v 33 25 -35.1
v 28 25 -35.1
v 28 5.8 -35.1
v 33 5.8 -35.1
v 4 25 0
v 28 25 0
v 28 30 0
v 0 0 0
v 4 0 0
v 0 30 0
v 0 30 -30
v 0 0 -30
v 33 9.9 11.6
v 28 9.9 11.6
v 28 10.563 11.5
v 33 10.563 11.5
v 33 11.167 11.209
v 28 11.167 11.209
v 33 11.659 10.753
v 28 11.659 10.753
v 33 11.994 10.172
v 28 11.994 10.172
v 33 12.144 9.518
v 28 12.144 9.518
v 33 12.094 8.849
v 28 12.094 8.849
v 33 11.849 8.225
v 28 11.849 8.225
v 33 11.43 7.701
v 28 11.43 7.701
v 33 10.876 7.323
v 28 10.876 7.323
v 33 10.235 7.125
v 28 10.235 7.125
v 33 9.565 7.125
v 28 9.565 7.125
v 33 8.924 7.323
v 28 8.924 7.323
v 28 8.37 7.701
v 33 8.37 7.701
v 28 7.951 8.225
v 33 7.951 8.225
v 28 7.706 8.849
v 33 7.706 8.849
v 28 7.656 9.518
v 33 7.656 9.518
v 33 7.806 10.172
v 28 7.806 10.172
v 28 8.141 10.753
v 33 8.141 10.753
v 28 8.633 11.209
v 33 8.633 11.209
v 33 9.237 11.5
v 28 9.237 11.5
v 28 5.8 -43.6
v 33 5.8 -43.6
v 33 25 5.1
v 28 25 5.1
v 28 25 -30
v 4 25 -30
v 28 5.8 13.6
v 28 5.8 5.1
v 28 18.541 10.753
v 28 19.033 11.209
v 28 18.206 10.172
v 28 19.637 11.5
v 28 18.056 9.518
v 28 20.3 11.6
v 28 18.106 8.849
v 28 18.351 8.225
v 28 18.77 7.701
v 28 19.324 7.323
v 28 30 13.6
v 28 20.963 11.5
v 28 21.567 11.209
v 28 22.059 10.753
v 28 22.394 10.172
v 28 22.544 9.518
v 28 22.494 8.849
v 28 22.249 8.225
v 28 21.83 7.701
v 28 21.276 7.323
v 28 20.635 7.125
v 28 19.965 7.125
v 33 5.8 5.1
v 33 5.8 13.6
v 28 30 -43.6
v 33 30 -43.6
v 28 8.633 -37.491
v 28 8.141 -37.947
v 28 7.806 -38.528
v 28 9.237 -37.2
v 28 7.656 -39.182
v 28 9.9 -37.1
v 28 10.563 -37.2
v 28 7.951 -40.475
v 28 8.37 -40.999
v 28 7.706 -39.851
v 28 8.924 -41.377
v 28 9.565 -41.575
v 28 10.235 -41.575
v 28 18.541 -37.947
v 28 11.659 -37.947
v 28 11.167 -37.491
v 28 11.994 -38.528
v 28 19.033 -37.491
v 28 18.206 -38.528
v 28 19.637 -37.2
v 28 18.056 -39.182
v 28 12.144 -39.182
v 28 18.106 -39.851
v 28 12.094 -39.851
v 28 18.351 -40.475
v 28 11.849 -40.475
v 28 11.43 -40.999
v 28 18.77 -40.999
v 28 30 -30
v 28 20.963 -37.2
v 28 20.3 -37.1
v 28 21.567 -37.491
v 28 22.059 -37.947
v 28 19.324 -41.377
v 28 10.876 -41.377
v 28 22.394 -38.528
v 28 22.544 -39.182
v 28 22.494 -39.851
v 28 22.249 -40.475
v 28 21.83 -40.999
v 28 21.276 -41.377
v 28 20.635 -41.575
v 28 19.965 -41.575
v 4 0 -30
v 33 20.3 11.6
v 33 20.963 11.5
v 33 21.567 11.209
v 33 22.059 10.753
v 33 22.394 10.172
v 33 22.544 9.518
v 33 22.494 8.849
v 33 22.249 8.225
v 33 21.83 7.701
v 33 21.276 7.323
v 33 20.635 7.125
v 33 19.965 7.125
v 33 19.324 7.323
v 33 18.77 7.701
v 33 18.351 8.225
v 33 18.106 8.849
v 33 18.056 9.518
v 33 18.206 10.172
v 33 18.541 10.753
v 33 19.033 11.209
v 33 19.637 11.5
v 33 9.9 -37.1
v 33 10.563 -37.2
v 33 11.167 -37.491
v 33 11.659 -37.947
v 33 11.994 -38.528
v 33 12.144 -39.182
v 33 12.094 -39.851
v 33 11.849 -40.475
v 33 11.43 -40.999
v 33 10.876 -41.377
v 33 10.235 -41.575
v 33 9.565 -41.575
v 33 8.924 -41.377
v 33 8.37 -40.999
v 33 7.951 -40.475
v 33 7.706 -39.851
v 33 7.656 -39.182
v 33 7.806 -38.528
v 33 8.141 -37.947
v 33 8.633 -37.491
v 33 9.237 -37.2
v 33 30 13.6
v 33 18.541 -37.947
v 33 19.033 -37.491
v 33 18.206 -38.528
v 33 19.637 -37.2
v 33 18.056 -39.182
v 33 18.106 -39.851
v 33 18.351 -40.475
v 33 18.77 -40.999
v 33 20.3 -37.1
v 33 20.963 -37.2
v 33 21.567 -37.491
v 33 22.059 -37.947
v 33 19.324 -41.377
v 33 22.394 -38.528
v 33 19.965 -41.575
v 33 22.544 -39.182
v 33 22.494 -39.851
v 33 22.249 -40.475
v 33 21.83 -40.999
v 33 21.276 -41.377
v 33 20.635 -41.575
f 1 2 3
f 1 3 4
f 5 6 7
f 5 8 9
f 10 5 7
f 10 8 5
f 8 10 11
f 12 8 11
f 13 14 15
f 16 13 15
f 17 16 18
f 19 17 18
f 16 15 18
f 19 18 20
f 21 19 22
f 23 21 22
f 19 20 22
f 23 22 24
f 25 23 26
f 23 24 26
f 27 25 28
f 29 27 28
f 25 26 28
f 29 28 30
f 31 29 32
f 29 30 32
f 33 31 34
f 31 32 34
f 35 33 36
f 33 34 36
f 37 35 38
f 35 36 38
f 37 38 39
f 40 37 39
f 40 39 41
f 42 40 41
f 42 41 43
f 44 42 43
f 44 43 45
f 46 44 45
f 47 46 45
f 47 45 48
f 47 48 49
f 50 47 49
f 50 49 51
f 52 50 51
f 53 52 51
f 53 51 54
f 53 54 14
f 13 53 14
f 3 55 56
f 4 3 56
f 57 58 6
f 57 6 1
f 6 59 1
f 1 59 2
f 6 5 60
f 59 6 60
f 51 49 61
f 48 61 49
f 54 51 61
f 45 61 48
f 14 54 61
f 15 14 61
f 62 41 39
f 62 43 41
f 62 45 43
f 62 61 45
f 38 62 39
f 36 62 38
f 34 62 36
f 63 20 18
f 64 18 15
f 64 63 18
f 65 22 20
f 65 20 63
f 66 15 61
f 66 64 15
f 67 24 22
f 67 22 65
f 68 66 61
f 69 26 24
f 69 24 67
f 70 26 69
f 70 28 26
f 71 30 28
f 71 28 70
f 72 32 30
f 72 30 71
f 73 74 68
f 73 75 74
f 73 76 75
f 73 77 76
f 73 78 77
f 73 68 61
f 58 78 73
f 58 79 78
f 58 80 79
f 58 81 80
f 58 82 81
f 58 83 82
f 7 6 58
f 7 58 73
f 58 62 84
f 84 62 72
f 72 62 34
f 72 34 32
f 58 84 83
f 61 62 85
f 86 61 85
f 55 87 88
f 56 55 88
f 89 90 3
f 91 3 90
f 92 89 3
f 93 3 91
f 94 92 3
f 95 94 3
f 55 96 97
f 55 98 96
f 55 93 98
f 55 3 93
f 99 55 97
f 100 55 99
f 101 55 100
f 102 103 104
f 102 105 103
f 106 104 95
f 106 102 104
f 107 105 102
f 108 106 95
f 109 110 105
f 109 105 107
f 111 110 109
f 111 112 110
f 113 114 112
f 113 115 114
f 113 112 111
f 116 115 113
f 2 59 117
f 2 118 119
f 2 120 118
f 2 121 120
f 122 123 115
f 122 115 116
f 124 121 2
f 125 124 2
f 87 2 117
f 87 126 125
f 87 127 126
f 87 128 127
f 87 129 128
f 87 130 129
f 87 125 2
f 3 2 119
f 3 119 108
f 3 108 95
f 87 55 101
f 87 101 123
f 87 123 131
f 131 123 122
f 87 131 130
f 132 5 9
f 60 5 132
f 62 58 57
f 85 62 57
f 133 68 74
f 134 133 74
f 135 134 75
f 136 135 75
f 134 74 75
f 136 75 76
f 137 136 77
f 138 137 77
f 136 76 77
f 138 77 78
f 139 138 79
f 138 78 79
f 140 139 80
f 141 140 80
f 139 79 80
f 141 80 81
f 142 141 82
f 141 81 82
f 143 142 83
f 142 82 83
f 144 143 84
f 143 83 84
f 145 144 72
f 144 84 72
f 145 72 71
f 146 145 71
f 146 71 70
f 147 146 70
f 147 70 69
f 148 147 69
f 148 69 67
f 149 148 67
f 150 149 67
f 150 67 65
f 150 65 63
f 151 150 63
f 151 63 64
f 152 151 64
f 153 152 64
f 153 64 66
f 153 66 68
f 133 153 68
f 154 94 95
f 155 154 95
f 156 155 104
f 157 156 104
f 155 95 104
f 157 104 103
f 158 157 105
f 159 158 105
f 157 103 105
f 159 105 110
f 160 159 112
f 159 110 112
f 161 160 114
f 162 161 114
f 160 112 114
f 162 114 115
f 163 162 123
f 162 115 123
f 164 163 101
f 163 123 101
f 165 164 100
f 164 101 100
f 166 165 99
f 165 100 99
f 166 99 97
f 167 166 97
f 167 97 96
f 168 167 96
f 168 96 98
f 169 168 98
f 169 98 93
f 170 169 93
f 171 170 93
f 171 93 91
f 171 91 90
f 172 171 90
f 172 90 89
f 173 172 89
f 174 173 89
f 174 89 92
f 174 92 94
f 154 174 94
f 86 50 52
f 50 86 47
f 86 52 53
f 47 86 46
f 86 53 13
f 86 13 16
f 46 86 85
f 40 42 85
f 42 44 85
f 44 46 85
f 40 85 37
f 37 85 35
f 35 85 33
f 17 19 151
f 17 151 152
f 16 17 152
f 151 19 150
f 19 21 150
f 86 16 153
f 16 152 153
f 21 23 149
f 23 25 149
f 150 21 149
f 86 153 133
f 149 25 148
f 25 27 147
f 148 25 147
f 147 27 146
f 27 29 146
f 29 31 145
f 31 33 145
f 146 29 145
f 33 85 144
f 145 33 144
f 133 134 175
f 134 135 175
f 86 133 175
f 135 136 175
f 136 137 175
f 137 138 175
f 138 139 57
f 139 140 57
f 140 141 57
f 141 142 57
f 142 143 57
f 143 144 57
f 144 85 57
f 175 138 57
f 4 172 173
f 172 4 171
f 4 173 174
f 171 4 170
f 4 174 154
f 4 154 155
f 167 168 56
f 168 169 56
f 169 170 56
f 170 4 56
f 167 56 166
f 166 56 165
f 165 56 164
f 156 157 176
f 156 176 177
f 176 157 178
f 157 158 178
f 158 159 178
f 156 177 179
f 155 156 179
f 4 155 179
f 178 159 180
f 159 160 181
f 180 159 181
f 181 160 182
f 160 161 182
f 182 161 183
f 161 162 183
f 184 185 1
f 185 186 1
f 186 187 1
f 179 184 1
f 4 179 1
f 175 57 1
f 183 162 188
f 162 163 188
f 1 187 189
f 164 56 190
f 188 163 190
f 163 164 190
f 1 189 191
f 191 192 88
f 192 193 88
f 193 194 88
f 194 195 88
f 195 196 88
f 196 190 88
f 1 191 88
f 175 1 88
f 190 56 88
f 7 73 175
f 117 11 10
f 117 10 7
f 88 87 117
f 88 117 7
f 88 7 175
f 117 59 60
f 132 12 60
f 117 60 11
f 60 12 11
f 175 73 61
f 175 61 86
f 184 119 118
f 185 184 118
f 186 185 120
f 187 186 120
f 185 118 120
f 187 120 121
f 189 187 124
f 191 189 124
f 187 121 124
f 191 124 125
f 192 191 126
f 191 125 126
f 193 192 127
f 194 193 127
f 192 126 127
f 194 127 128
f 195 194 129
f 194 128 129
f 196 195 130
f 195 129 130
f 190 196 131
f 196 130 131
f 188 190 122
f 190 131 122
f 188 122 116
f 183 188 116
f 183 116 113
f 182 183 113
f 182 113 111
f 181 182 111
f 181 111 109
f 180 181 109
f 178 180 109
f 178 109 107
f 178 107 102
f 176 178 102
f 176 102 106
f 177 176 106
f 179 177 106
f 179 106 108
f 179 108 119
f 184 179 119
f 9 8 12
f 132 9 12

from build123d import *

# Parameters (mm, degrees)
SKETCH1_W            = 30
SKETCH1_H            = 30
BOSS_EXTRUDE1_DEPTH  = 4
SKETCH3_W            = 30
SKETCH3_H            = 5
BOSS_EXTRUDE2_DEPTH  = 24
SKETCH4_W            = 40.2
SKETCH4_H            = 5
BOSS_EXTRUDE3_DEPTH  = 5
SKETCH5_W            = 5
SKETCH5_H            = 24.2
BOSS_EXTRUDE4_DEPTH  = 8.5
LPATTERN1_COUNT      = 2
LPATTERN1_PITCH      = 48.7
M4_CLEARANCE_HOLE1_D = 4.5


with BuildPart() as part:
    # Sketch1 → Boss-Extrude1 (new body)
    with BuildSketch(Plane(origin=(0, 0, 0), x_dir=(0, 0, -1), z_dir=(1, 0, 0))):
        with Locations((15, 15)):
            Rectangle(SKETCH1_W, SKETCH1_H)
    extrude(amount=BOSS_EXTRUDE1_DEPTH)

    # Sketch3 → Boss-Extrude2 (add)
    with BuildSketch(Plane(origin=(4, 0, 0), x_dir=(0, 0, -1), z_dir=(1, 0, 0))):
        with Locations((15, 27.5)):
            Rectangle(SKETCH3_W, SKETCH3_H)
    extrude(amount=BOSS_EXTRUDE2_DEPTH)

    # Sketch4 → Boss-Extrude3 (add)
    with BuildSketch(Plane(origin=(28, 0, 0), x_dir=(0, 0, -1), z_dir=(1, 0, 0))):
        with Locations((15, 27.5)):
            Rectangle(SKETCH4_W, SKETCH4_H)
    extrude(amount=BOSS_EXTRUDE3_DEPTH)

    # Sketch5 → Boss-Extrude4 (add)
    with BuildSketch(Plane.XY.offset(5.1)):
        with Locations((30.5, 17.9)):
            Rectangle(SKETCH5_W, SKETCH5_H)
    boss_extrude4 = extrude(amount=BOSS_EXTRUDE4_DEPTH)

    # LPattern1: Boss-Extrude4 ×2
    with Locations(*[(0, 0, -i * LPATTERN1_PITCH) for i in range(1, LPATTERN1_COUNT)]):
        add(boss_extrude4)

    # M4 Clearance Hole1 (through all)
    with Locations(Plane(origin=(33, 0, 0), x_dir=(0, 0, -1), z_dir=(1, 0, 0))):
        with Locations((-9.35, 20.3), (-9.35, 9.9), (39.35, 20.3), (39.35, 9.9)):
            Hole(M4_CLEARANCE_HOLE1_D / 2)


solid = part.part
